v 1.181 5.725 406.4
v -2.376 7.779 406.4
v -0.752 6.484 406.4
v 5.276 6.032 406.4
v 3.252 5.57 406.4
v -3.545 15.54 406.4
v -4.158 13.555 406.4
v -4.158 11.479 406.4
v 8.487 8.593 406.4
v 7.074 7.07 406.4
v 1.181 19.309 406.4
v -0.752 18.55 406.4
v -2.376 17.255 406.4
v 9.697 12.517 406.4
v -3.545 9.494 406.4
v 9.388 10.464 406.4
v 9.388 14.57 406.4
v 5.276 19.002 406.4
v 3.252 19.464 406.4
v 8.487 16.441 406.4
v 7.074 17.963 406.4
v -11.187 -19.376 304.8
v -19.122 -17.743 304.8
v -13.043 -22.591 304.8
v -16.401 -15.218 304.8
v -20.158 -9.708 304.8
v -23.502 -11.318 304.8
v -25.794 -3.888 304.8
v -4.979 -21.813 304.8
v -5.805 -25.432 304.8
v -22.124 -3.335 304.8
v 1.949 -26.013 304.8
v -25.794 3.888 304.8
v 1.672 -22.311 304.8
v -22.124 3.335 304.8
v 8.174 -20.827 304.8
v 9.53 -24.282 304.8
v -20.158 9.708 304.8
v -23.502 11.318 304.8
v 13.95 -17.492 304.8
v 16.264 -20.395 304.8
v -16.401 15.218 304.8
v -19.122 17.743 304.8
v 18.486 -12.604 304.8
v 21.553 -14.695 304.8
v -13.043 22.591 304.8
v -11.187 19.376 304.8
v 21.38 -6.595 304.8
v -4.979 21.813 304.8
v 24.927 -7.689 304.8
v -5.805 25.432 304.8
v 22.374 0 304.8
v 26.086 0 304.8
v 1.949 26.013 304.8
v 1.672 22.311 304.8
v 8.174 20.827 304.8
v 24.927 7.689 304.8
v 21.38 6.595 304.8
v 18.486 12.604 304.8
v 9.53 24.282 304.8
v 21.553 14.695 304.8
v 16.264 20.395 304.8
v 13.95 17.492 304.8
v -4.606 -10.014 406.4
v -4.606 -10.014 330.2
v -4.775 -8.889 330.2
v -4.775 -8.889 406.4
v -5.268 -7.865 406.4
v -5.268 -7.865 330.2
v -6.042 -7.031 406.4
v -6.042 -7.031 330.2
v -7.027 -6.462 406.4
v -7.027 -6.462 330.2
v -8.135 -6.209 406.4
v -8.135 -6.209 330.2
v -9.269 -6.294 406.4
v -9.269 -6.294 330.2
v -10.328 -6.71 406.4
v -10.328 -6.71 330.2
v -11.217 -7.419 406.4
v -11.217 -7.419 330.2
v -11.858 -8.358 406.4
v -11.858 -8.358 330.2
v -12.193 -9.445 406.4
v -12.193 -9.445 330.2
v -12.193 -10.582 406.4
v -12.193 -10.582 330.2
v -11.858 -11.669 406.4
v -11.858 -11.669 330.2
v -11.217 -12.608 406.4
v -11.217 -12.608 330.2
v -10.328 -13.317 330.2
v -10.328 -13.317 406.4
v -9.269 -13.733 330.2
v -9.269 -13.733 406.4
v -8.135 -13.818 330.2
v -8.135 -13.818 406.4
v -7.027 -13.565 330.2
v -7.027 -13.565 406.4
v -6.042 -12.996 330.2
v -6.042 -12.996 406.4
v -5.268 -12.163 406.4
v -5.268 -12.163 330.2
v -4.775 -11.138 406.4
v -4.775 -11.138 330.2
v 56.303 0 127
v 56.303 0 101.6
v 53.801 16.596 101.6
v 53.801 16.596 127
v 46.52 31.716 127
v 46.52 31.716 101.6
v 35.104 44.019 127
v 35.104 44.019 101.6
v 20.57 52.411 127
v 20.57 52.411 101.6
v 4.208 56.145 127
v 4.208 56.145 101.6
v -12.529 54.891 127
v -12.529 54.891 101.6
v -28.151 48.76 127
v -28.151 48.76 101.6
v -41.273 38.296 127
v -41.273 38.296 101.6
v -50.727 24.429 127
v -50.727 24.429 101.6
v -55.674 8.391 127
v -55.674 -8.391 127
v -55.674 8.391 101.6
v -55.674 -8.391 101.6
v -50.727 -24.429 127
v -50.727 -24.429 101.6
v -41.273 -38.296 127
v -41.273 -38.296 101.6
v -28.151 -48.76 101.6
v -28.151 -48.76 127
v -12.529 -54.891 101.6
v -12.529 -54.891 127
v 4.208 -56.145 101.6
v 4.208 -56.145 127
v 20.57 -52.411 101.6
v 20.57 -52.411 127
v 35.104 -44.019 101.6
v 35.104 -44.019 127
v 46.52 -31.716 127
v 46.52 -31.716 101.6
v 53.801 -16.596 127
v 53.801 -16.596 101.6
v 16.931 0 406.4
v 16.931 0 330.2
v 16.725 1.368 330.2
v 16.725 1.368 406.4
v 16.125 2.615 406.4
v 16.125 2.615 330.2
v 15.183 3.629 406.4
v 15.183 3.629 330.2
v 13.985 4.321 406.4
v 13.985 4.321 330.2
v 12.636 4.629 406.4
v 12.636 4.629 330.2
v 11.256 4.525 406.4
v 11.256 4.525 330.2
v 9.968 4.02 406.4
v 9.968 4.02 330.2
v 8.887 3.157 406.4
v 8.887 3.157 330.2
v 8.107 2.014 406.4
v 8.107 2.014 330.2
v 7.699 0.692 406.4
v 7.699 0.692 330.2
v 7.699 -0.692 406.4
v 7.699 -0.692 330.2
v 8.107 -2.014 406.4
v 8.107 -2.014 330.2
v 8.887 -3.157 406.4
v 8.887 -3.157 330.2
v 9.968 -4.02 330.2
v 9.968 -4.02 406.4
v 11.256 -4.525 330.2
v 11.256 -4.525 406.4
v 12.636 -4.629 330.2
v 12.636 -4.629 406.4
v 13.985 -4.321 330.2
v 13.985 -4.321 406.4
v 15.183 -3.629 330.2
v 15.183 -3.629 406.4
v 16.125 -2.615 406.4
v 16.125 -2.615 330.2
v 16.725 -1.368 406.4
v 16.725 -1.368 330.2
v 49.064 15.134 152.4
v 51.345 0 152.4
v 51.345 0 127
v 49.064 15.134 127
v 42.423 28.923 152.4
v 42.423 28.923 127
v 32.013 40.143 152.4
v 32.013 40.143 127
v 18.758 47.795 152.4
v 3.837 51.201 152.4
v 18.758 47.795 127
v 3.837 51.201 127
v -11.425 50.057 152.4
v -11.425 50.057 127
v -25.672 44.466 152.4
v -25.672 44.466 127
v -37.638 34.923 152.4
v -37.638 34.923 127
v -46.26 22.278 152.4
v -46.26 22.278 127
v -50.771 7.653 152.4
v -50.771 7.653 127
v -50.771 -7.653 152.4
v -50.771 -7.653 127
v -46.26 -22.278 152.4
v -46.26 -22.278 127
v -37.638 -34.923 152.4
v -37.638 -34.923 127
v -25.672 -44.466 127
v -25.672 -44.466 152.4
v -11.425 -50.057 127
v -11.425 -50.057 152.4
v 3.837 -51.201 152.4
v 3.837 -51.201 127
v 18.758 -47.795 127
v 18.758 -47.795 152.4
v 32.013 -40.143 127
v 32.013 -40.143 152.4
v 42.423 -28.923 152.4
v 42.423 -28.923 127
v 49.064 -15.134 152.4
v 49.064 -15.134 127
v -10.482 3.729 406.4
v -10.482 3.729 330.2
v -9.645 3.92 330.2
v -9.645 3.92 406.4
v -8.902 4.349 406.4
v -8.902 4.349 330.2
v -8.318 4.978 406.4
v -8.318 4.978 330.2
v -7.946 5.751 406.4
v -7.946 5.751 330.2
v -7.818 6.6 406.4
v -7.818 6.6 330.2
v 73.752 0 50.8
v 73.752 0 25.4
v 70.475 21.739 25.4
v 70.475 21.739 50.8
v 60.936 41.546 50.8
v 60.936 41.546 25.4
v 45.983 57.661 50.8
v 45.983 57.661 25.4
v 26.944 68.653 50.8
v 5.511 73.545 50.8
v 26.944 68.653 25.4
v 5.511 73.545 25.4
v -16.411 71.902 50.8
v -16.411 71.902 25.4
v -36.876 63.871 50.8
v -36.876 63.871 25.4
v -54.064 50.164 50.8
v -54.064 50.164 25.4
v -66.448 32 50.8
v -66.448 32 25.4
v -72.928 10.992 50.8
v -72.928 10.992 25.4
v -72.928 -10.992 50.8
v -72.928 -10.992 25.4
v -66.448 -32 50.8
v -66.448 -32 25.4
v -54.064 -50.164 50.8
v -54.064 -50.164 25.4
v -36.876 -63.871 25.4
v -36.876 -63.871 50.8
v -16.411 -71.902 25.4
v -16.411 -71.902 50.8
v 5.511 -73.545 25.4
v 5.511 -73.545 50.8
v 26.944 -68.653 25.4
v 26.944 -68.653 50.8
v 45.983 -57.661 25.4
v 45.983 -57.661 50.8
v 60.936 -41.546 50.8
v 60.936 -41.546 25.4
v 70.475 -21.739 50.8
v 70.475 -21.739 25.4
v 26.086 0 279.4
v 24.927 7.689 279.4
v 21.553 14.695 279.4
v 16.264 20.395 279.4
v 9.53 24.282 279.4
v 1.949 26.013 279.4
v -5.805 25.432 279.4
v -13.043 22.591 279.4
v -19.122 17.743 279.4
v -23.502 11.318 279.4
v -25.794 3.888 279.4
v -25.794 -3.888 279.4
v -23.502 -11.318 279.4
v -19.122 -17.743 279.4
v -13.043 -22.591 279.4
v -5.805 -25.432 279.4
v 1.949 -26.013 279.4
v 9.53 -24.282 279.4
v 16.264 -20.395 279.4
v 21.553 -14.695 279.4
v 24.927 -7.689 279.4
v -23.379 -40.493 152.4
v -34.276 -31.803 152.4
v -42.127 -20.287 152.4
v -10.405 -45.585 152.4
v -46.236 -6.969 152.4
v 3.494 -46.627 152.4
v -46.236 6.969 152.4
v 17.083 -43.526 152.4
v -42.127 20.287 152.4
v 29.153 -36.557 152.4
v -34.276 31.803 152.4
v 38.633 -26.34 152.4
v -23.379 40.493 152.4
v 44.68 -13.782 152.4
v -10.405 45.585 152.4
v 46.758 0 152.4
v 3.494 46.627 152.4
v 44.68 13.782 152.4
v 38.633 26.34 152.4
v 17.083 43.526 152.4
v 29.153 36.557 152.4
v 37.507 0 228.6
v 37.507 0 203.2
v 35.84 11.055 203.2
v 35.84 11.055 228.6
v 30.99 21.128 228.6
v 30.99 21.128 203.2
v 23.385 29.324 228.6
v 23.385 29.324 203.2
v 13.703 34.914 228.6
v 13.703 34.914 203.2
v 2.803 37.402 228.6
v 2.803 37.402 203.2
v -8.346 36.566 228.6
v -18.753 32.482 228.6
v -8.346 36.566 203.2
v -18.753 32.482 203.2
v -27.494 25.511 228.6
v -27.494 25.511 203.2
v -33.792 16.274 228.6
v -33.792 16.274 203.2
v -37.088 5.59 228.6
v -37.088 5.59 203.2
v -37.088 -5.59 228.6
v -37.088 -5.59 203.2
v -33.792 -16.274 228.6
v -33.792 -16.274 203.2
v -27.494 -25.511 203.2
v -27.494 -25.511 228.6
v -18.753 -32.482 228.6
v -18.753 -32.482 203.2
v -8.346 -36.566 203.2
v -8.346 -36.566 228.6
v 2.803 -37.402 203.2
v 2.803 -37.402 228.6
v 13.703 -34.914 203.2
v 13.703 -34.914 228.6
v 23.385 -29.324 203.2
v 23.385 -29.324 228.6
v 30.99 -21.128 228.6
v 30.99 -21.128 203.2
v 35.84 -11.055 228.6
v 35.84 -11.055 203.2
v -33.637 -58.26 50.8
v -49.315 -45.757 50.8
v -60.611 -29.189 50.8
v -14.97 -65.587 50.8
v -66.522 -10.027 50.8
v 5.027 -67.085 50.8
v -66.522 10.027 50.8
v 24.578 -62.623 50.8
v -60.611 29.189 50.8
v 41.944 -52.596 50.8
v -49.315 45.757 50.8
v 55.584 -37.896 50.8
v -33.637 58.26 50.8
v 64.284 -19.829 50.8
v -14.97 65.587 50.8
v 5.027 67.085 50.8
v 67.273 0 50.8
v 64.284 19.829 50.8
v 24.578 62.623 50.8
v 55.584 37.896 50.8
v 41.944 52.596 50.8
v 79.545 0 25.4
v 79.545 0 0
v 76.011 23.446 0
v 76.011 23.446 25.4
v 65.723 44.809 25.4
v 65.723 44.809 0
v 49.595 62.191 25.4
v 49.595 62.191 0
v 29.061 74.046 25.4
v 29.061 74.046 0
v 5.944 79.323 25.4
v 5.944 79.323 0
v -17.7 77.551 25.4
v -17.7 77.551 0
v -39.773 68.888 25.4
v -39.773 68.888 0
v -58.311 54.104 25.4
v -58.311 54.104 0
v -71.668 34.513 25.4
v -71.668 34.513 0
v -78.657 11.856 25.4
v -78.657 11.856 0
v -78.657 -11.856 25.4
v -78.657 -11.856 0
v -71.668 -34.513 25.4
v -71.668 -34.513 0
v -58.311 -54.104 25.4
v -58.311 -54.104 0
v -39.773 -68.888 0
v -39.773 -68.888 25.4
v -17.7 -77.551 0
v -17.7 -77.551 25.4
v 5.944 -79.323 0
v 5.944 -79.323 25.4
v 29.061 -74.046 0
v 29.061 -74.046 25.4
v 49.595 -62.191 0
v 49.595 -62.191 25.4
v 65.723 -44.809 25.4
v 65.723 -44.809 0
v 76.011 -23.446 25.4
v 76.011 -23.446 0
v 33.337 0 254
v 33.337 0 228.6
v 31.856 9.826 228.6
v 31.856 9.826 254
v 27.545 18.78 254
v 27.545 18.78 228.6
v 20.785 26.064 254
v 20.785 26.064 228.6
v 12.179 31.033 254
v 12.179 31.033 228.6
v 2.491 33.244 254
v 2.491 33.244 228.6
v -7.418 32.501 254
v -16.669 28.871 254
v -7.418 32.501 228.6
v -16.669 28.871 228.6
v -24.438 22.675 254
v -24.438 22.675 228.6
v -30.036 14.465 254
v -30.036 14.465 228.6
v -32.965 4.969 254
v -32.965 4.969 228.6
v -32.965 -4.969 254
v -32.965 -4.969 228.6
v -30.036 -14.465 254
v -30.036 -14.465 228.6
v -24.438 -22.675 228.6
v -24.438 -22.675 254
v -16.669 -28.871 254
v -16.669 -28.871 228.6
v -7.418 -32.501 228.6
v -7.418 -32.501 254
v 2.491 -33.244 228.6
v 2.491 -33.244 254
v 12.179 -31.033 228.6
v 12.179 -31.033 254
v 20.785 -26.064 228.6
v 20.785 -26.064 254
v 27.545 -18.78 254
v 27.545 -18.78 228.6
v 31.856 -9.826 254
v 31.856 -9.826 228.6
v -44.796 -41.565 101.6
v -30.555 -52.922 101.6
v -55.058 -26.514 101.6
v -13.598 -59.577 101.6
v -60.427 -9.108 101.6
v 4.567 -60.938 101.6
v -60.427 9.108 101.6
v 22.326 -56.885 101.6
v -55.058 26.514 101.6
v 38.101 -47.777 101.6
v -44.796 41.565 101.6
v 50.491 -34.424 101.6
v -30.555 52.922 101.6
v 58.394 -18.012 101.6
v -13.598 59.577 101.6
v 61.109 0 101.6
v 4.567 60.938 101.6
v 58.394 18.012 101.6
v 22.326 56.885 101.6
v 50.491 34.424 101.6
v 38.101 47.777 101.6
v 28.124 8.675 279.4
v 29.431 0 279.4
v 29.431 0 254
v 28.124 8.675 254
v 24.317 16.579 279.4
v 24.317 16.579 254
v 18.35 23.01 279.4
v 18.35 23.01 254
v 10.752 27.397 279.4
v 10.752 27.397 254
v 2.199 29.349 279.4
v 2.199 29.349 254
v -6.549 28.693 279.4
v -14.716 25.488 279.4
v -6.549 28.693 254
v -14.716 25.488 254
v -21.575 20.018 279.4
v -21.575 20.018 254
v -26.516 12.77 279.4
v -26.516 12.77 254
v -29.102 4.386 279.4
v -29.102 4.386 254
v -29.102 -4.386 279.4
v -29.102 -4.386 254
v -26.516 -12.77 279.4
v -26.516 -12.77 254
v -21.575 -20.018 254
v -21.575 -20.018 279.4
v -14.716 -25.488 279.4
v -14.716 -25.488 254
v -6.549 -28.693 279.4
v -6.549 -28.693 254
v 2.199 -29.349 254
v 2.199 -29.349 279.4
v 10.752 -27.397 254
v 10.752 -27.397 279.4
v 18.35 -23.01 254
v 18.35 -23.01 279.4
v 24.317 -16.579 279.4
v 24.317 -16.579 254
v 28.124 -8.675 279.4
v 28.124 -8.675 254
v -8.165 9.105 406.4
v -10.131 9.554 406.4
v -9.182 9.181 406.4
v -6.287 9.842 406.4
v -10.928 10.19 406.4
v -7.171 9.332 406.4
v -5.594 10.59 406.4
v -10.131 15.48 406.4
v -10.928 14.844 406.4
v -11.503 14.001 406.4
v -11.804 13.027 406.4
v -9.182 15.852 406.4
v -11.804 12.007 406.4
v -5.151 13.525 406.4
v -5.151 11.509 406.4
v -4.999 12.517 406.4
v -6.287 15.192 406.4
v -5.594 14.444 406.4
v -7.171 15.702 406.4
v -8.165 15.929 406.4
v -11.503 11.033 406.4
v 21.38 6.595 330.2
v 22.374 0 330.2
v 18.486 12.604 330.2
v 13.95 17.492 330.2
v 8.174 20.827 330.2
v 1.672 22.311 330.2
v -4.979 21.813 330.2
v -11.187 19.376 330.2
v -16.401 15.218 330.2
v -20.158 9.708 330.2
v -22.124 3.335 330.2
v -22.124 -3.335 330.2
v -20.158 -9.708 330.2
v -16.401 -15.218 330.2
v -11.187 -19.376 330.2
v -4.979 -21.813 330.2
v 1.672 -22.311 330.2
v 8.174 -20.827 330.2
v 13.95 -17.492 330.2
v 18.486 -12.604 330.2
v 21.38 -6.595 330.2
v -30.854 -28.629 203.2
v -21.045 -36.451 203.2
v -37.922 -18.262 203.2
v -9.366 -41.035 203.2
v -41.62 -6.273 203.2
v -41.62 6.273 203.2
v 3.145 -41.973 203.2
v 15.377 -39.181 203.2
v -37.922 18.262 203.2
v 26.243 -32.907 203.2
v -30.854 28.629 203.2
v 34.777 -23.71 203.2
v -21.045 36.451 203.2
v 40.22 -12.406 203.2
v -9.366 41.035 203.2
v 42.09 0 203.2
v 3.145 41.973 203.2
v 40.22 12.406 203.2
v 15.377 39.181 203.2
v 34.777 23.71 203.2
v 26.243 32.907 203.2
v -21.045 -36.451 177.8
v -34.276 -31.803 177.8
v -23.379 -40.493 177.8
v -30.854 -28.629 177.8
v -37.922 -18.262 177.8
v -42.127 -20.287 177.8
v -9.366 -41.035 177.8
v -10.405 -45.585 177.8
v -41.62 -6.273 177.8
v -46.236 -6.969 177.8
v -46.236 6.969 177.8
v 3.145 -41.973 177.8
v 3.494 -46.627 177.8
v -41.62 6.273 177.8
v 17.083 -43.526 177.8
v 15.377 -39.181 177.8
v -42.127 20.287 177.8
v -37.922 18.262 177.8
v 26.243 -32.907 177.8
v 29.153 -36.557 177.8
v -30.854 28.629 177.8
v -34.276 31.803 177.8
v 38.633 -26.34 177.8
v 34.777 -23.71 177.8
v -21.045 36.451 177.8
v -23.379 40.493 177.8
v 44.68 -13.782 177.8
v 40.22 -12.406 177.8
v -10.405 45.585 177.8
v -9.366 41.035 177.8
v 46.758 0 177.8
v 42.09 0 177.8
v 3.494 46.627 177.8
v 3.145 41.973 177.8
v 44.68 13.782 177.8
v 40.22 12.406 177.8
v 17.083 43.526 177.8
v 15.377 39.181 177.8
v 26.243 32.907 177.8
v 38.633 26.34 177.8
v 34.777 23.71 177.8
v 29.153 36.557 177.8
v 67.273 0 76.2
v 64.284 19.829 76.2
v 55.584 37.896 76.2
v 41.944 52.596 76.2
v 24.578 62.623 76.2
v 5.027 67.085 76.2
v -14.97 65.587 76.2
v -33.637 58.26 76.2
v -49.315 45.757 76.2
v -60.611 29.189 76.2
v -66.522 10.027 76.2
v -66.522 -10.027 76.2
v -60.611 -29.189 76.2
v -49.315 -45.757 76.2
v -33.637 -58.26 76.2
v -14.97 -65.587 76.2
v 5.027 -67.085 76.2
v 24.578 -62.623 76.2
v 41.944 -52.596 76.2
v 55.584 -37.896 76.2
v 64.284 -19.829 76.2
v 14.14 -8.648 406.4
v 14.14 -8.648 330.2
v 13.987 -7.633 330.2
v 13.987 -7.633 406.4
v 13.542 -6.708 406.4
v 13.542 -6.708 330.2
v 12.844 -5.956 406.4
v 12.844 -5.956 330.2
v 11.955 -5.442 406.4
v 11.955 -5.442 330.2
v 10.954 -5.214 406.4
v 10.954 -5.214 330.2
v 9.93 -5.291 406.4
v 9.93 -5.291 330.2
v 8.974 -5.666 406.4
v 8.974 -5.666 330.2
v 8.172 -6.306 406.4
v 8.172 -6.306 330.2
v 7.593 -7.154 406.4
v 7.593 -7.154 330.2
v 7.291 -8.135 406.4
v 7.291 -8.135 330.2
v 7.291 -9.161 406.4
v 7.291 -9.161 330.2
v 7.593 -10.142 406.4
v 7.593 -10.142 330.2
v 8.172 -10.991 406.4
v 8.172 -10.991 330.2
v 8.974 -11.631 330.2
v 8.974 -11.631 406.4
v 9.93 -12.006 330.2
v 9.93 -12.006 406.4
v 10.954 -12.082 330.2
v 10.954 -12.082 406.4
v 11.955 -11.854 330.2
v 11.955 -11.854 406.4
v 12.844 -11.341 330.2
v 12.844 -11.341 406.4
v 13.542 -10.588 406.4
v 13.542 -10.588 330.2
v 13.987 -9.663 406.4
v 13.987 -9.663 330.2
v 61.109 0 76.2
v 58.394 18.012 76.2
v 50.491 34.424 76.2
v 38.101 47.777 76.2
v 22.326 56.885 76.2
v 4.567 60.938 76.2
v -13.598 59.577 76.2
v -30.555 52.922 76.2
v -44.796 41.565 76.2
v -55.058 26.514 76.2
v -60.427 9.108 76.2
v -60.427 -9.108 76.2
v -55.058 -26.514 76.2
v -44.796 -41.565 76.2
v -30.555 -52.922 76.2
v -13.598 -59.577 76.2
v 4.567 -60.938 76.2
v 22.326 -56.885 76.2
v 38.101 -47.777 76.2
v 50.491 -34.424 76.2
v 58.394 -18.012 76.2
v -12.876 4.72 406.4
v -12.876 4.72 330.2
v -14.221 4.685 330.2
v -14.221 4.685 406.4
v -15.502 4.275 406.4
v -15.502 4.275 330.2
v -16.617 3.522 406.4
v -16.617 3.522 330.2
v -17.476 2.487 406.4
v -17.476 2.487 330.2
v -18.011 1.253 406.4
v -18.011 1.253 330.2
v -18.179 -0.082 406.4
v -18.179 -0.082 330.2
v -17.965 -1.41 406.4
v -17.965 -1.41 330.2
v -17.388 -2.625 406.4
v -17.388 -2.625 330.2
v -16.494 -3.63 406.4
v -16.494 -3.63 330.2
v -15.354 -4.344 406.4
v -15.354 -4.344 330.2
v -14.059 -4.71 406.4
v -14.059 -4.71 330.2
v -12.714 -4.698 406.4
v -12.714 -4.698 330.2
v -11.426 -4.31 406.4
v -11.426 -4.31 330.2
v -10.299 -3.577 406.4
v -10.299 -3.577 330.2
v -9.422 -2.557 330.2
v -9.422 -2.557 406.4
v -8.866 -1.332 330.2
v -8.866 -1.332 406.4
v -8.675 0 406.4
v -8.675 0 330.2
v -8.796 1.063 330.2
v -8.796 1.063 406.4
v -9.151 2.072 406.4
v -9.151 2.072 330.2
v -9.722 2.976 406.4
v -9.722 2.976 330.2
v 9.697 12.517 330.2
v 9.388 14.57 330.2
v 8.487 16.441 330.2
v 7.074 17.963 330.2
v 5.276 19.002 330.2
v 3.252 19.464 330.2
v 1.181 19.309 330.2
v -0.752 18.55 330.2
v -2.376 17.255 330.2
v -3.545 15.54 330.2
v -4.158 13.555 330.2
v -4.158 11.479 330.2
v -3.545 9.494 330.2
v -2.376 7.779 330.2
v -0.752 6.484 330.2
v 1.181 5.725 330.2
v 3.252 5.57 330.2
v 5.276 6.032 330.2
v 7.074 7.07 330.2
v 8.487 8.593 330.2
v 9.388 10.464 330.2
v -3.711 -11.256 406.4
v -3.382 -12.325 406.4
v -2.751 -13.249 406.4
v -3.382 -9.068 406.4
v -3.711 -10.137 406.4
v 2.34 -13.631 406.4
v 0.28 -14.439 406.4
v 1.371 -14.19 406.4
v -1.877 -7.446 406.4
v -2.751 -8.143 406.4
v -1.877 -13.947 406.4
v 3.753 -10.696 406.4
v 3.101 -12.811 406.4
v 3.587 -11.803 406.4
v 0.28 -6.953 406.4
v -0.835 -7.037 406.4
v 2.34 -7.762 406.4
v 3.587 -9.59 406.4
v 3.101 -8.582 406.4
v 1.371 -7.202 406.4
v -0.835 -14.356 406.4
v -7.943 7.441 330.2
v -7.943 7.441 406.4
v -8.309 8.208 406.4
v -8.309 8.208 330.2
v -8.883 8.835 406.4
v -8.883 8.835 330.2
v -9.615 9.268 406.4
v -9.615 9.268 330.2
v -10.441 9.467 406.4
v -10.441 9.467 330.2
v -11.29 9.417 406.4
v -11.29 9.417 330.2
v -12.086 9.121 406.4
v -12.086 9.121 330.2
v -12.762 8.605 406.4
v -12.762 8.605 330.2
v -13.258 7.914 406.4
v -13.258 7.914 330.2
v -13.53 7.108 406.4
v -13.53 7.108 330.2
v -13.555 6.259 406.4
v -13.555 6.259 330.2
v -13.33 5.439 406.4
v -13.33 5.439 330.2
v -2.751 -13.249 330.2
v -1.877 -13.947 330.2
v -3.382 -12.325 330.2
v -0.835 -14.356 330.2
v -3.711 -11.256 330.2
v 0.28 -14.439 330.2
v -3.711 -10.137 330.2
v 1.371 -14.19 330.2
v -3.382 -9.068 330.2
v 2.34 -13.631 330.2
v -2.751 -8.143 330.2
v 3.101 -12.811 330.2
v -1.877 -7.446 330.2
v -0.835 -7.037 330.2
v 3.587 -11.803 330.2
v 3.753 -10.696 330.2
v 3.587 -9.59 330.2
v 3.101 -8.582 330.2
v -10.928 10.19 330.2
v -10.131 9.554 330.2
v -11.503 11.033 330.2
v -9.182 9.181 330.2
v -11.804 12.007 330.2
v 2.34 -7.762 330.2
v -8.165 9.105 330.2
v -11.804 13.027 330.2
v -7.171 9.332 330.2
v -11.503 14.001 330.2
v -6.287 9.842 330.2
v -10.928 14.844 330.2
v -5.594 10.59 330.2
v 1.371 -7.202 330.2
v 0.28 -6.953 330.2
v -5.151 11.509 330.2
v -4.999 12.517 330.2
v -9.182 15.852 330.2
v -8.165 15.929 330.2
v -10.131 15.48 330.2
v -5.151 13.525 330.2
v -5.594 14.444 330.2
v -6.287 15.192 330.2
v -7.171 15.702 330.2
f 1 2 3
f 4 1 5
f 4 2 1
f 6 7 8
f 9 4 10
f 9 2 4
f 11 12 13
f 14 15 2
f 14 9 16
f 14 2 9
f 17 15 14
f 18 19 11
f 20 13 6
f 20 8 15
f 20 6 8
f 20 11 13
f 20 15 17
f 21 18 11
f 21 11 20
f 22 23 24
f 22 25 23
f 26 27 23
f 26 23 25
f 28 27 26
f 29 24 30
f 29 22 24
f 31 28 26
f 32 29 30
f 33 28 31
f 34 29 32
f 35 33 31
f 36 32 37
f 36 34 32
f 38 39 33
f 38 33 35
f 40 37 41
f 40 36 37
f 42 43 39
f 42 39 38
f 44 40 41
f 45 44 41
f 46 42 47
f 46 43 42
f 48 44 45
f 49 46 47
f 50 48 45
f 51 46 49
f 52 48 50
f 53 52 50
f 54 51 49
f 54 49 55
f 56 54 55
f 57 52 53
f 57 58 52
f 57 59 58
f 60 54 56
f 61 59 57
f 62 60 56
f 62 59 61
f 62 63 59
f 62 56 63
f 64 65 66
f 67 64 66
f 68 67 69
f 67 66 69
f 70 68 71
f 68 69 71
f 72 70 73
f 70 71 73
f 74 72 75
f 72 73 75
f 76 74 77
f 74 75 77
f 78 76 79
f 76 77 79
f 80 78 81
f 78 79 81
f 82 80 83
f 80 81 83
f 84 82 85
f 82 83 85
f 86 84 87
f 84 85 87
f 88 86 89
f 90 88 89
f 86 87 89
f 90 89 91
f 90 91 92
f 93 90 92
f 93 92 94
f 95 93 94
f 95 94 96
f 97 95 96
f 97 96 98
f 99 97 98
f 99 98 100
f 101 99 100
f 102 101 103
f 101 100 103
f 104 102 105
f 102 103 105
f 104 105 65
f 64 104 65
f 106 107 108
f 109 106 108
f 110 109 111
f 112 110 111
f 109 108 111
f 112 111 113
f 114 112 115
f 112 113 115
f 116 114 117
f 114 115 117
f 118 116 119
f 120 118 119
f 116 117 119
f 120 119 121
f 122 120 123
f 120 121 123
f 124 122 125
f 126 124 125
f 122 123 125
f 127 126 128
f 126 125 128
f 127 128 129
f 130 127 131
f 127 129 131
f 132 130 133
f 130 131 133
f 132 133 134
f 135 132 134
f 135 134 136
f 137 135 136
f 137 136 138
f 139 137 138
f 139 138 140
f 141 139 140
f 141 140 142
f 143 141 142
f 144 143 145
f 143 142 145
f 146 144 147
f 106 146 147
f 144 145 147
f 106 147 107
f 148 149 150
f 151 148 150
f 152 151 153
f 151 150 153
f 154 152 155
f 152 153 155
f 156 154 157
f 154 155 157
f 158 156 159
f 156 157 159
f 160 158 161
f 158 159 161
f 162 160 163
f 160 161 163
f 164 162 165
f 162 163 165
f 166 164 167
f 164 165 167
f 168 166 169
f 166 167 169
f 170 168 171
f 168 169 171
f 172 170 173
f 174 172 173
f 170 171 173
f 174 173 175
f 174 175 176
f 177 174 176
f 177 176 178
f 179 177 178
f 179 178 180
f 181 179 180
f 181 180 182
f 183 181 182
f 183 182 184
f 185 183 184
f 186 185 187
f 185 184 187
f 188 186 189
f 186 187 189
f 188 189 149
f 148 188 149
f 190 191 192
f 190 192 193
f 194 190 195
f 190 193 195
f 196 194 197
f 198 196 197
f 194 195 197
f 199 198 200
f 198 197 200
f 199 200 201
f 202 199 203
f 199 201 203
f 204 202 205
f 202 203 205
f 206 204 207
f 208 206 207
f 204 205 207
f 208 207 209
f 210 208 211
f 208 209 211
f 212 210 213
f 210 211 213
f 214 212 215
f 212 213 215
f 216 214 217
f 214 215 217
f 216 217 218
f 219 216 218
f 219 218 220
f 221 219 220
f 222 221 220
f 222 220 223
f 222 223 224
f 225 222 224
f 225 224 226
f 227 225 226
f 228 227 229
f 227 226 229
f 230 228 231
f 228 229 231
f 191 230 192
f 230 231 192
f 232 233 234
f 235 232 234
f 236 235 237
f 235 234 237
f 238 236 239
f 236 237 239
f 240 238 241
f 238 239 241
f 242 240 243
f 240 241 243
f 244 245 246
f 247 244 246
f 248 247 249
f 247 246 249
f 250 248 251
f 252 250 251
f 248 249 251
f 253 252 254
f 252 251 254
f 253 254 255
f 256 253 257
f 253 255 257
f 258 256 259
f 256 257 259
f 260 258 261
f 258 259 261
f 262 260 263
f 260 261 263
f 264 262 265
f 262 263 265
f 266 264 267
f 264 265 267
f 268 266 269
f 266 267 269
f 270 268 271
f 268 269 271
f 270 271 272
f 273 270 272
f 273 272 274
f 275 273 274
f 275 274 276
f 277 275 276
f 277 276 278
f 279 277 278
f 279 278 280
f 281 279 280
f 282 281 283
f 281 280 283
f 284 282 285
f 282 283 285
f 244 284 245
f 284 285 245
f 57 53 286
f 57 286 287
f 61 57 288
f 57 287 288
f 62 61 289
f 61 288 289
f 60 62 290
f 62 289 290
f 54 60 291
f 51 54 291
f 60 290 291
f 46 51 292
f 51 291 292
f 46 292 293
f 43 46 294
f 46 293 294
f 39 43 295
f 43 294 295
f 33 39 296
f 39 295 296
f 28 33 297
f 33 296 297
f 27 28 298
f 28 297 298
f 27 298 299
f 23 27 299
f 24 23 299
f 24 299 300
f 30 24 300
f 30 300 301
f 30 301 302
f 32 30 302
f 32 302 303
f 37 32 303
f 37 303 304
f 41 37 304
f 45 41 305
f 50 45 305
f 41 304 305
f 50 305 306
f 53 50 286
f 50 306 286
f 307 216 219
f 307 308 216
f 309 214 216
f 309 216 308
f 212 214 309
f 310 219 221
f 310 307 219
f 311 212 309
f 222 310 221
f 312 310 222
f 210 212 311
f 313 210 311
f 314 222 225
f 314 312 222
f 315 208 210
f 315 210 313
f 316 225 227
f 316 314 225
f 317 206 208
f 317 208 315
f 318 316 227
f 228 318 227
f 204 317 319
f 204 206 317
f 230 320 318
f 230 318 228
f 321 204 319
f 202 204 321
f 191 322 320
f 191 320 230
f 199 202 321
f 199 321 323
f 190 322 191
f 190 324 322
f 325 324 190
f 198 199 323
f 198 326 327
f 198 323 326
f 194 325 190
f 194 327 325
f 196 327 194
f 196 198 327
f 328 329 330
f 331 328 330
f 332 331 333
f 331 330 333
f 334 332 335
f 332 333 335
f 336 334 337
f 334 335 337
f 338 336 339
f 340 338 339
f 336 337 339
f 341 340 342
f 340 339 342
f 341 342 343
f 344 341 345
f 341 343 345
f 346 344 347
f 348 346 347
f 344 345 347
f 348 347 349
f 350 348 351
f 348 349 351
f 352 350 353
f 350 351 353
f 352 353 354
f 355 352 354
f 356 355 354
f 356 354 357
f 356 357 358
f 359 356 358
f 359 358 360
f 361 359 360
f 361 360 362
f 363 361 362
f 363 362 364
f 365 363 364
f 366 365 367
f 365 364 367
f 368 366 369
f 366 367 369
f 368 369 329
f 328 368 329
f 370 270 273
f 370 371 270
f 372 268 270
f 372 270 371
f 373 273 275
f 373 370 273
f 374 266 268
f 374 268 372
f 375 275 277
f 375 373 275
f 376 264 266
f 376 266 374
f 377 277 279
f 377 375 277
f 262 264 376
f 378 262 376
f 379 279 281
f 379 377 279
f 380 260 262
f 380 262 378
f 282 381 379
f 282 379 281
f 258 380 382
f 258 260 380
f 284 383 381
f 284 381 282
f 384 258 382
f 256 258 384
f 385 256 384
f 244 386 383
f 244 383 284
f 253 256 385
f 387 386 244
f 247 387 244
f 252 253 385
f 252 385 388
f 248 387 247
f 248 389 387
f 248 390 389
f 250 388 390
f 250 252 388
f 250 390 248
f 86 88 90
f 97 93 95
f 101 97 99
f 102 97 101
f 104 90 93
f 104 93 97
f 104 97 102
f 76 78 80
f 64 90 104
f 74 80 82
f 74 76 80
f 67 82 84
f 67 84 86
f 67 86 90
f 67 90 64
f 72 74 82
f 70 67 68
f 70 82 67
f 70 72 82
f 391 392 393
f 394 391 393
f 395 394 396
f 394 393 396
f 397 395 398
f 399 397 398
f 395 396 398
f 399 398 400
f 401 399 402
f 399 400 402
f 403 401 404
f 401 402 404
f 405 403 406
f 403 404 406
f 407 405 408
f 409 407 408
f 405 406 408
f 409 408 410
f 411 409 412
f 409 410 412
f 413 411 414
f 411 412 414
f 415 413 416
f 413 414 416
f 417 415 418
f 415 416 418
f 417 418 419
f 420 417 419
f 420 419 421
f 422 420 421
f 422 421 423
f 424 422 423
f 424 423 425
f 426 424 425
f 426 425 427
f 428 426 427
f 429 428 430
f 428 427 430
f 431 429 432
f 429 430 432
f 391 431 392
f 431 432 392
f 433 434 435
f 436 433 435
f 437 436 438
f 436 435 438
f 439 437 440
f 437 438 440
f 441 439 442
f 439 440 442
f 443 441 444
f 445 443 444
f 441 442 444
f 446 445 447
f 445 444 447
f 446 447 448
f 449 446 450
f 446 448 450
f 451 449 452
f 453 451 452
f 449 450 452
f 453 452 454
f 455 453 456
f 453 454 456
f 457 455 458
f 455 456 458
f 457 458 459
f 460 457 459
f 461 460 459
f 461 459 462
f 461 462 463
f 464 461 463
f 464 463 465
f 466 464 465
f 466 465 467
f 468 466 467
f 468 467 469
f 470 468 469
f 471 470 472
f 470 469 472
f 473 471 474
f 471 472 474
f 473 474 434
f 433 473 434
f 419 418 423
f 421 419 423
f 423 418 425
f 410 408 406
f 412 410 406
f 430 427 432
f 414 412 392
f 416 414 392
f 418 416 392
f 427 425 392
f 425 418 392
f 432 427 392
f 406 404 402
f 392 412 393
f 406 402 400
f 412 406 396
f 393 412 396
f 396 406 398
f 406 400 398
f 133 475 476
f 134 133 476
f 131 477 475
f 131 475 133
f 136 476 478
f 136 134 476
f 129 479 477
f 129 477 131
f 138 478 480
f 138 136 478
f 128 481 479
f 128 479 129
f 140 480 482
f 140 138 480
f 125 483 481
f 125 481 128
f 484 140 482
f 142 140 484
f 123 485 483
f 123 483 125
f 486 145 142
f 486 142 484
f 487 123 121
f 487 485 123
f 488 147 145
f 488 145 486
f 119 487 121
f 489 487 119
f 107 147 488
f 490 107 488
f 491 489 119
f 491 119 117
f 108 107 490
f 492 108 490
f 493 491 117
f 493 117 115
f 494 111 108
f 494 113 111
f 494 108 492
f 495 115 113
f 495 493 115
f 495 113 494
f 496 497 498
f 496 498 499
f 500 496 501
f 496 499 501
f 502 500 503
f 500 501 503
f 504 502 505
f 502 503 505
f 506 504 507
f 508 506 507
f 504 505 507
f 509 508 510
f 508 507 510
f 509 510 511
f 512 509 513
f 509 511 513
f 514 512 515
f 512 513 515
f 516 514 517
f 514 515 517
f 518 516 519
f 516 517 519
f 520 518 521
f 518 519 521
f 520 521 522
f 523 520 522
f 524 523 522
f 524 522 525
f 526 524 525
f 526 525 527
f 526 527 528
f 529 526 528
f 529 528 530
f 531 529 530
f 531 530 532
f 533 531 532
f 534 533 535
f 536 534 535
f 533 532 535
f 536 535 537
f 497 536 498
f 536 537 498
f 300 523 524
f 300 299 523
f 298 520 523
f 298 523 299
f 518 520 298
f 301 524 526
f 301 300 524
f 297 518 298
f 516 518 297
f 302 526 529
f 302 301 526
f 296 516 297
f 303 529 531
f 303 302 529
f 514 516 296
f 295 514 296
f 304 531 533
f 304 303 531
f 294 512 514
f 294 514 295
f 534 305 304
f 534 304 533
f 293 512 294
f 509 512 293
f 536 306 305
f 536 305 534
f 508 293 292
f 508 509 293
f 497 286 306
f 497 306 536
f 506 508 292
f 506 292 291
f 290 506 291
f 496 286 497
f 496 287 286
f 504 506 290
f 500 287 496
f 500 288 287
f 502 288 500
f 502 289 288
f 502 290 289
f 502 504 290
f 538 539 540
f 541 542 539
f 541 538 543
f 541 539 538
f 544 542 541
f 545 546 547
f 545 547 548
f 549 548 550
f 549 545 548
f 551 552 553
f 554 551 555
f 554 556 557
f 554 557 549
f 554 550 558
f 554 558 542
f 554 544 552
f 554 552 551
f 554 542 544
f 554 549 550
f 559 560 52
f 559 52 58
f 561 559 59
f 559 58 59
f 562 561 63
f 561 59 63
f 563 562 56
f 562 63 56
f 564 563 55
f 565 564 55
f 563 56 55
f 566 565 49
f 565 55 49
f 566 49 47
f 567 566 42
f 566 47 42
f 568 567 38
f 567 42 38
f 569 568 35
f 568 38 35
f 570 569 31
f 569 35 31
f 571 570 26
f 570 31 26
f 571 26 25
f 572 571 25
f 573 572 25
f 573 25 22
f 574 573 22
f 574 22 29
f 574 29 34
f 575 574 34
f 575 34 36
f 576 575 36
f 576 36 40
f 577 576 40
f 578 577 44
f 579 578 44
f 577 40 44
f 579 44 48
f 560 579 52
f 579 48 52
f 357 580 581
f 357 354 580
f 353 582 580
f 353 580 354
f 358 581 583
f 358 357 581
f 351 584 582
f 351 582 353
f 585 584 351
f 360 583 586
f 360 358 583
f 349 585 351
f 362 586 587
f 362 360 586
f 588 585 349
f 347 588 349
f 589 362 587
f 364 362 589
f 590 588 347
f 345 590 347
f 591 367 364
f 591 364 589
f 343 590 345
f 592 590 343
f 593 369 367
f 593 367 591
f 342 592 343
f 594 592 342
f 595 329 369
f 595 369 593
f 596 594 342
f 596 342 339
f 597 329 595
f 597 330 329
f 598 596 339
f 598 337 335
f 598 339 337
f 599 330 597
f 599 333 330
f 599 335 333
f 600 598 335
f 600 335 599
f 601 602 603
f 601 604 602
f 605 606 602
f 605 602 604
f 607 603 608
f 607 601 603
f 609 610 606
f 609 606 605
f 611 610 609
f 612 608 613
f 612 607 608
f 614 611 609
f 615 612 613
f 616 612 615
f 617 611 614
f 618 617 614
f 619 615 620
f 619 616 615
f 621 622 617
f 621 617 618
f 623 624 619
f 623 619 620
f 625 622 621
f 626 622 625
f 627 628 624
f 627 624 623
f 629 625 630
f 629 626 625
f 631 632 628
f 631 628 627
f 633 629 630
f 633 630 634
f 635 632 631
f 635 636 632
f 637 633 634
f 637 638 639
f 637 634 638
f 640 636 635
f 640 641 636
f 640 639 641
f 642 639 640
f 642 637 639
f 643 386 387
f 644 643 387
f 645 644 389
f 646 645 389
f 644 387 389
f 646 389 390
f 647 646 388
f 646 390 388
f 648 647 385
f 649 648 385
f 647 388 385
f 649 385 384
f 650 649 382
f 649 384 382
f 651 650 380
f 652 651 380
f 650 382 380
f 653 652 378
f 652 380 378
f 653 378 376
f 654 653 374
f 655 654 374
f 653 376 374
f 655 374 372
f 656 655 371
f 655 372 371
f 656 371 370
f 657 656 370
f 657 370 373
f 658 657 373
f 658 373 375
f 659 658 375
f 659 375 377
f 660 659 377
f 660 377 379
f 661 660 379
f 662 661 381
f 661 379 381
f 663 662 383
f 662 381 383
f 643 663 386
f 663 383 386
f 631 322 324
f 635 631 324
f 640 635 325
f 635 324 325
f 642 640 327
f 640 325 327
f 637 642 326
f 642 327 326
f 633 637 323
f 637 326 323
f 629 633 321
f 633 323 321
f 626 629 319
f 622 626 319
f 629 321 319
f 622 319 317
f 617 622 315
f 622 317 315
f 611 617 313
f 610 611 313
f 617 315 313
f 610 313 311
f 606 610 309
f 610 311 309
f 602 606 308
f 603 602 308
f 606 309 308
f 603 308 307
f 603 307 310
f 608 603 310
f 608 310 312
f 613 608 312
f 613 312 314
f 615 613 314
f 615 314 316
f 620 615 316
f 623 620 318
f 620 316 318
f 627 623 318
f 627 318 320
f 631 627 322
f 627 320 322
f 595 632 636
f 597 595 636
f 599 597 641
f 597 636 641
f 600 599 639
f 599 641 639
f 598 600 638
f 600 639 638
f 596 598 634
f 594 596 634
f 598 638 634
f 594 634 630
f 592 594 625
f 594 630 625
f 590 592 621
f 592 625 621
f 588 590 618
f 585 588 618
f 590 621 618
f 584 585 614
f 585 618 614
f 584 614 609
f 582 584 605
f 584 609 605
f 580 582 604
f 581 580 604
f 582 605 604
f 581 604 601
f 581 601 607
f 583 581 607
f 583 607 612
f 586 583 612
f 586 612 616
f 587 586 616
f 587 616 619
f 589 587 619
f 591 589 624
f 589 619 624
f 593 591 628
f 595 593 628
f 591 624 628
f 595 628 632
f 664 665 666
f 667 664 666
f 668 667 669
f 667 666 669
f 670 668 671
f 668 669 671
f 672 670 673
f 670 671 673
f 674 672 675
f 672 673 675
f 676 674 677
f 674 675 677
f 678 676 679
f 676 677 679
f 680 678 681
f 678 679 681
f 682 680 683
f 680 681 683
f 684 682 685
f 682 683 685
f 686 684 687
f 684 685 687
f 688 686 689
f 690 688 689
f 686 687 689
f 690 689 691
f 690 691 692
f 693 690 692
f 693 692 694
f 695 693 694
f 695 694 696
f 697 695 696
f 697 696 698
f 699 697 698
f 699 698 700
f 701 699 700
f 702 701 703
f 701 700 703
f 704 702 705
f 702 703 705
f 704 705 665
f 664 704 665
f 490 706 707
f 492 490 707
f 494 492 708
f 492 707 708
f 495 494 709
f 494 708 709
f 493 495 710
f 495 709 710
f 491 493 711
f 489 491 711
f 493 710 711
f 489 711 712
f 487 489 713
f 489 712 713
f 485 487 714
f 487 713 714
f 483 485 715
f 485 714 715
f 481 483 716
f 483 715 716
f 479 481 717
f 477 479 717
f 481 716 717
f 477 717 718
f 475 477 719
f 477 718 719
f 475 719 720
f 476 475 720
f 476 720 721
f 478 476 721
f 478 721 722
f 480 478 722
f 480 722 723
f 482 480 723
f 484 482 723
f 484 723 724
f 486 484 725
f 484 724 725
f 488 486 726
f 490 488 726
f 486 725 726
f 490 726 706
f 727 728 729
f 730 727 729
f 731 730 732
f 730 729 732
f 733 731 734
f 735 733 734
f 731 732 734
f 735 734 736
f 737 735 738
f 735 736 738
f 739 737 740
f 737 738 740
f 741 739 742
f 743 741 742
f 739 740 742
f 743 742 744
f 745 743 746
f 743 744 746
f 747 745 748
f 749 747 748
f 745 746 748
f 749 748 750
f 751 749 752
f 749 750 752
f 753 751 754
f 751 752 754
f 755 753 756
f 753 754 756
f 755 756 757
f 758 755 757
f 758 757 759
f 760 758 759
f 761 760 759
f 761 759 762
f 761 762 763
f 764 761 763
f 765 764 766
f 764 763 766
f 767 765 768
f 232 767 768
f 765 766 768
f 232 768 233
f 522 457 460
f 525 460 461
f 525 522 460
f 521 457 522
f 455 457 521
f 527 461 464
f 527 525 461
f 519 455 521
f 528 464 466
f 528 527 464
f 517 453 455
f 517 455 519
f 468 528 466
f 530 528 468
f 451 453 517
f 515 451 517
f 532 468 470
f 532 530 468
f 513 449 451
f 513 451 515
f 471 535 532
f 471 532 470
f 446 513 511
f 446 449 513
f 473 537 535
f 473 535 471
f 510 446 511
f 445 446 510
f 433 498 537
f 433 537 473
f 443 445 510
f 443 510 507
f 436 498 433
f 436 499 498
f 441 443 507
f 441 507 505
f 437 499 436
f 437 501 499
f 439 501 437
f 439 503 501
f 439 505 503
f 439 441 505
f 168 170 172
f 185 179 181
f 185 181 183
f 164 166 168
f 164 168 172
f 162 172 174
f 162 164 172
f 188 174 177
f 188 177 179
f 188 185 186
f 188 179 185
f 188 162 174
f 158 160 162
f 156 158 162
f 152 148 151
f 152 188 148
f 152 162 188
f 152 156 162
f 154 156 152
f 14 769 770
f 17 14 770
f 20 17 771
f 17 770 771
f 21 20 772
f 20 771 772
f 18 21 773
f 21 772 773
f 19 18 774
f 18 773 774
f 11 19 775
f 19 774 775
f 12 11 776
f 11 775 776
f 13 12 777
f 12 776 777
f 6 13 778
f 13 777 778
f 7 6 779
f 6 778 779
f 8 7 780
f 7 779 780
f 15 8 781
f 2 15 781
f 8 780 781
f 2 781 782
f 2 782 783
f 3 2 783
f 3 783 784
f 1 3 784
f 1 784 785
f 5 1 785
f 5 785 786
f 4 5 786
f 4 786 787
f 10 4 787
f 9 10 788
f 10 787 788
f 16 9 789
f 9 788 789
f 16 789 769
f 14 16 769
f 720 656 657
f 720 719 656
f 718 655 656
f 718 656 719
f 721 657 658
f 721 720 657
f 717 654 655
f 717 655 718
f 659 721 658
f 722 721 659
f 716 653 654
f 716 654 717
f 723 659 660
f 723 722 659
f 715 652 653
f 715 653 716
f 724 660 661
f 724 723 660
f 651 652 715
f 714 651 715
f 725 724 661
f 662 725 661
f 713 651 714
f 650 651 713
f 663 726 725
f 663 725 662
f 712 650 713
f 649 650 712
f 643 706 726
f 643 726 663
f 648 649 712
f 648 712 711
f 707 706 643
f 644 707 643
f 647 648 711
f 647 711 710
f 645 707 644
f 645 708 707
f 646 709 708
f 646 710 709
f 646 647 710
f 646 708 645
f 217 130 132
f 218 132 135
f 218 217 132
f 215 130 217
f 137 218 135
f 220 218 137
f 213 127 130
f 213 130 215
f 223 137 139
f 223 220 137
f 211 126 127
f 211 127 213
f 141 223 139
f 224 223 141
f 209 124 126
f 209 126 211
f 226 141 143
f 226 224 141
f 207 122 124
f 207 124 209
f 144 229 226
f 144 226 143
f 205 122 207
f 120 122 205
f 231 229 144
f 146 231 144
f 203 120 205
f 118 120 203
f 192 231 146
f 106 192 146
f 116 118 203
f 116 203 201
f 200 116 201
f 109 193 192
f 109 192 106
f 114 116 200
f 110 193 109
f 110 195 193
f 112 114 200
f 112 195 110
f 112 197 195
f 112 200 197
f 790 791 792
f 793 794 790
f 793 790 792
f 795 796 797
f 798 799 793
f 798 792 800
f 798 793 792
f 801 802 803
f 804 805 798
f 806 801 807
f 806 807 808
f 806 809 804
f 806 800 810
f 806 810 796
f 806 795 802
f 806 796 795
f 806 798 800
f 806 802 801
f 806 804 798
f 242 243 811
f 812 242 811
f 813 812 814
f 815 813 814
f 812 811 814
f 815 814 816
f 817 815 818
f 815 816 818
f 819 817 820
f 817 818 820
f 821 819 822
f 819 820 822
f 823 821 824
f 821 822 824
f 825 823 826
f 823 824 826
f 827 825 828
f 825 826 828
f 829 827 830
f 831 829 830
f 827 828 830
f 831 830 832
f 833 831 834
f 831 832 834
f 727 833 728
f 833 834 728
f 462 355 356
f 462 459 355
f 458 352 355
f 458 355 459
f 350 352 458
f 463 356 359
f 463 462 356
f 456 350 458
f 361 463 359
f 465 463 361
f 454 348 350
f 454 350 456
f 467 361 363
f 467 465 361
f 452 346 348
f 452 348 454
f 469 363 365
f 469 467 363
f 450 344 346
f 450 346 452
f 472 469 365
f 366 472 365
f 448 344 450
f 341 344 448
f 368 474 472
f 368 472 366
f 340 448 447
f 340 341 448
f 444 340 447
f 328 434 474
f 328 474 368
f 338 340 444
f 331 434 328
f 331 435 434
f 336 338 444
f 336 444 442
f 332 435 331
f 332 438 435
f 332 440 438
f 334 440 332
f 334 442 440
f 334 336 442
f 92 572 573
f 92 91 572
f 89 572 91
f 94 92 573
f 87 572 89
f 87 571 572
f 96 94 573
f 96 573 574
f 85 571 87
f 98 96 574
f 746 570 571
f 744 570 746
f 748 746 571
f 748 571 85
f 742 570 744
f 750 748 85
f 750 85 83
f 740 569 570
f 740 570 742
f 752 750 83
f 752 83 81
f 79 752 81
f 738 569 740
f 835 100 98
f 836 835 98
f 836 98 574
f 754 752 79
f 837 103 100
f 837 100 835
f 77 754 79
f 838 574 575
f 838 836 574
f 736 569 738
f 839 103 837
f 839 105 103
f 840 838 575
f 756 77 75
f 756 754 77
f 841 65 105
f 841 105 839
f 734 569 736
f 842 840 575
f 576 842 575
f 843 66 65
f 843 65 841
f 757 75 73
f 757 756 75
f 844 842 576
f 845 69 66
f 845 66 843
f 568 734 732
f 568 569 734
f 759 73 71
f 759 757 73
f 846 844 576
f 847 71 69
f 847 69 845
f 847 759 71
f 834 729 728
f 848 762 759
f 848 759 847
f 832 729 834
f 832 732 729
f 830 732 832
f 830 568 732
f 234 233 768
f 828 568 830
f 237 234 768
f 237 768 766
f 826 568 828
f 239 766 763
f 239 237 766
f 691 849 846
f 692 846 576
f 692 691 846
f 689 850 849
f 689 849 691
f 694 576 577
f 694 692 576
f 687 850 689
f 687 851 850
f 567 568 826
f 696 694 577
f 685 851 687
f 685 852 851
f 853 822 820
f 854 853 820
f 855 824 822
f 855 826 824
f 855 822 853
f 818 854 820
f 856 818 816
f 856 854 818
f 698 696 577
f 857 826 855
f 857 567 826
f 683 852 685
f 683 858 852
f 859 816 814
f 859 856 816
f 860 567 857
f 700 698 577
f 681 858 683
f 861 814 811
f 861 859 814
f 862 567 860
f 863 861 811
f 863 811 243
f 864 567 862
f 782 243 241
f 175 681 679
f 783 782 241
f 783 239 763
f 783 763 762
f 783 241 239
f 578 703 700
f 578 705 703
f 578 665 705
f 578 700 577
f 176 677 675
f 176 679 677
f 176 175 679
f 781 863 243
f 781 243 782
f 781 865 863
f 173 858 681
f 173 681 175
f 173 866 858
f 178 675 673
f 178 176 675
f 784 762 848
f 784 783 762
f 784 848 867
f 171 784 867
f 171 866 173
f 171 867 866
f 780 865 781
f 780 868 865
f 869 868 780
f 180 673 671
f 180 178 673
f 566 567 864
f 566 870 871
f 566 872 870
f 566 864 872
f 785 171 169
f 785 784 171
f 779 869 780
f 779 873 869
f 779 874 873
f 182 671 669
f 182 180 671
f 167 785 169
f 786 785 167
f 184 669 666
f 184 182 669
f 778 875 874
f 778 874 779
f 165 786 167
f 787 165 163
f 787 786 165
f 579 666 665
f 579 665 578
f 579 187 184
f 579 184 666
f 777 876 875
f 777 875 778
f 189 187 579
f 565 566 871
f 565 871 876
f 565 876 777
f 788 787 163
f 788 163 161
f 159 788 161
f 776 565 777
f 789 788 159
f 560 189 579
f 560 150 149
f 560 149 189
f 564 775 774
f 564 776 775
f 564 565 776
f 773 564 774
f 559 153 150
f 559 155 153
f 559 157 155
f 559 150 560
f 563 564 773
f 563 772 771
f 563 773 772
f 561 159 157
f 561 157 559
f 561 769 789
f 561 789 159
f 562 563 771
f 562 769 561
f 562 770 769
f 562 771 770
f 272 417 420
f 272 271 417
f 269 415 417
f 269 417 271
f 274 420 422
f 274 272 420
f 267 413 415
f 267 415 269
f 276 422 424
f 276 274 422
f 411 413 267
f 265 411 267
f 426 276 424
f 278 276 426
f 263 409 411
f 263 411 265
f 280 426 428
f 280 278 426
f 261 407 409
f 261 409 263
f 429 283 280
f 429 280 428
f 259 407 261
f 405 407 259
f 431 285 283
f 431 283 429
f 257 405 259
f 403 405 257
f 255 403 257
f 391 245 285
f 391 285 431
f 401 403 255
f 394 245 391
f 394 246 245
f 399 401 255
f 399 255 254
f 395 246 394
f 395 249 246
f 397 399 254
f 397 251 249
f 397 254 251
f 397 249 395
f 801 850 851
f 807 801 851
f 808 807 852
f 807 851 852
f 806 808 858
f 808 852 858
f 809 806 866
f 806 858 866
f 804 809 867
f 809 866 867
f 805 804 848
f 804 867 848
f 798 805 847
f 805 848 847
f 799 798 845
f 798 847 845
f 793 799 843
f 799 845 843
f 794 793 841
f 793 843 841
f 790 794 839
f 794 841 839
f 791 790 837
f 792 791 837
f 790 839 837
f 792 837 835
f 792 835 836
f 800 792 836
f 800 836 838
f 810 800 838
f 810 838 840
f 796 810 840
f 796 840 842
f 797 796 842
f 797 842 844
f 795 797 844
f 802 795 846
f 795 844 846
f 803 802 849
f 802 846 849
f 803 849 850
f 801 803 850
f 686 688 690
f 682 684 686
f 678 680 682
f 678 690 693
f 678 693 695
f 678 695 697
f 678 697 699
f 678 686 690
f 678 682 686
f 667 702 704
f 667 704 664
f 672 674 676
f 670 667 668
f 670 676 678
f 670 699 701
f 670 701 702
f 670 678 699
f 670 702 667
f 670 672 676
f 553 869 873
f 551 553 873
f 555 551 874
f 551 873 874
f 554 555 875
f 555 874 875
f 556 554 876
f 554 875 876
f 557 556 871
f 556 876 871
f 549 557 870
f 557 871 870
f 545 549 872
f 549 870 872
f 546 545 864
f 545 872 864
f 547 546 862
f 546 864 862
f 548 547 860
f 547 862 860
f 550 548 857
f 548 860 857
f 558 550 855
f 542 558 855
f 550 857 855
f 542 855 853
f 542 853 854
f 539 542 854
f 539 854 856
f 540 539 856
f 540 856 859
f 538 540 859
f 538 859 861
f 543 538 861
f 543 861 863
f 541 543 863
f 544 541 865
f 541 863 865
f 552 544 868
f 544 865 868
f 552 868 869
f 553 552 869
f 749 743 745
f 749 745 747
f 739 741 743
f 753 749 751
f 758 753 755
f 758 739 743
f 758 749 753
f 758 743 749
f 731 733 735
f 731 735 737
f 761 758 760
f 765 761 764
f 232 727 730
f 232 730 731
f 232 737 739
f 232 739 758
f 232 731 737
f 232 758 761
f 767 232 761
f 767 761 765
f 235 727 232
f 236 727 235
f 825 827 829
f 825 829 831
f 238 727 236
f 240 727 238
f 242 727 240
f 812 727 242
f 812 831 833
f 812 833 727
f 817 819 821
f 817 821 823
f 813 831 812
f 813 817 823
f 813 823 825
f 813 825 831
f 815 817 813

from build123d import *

# Parameters (mm, degrees)
F0_R      = 79.5450036975
F1_DEPTH  = 25.4
F2_R      = 73.7515149203
F3_DEPTH  = 25.4
F4_R      = 67.2732126862
F5_DEPTH  = 25.4
F6_R      = 61.109227751
F7_DEPTH  = 25.4
F8_R      = 56.3027484013
F9_DEPTH  = 25.4
F10_R     = 51.3446313858
F11_DEPTH = 25.4
F12_R     = 46.7578066383
F13_DEPTH = 25.4
F14_R     = 42.0901979961
F15_DEPTH = 25.4
F16_R     = 37.5067154874
F17_DEPTH = 25.4
F18_R     = 33.3373265509
F19_DEPTH = 25.4
F20_R     = 29.4310817061
F21_DEPTH = 25.4
F22_R     = 26.0855959035
F23_DEPTH = 25.4
F24_R     = 22.3736631593
F25_DEPTH = 25.4
F26_R     = 3.4212934719
F26_R_2   = 3.8149535716
F26_R_3   = 4.641761037
F26_R_4   = 3.4439254553
F26_R_5   = 3.753363135
F26_R_6   = 6.9663604667
F27_DEPTH = 76.2


with BuildPart() as f1:
    # F0 (on Top) → F1 (new body)
    with BuildSketch(Plane.XY):
        Circle(F0_R)
    extrude(amount=F1_DEPTH)

    # F2 (on face) → F3 (join)
    with BuildSketch(Plane.XY.offset(25.4)):
        Circle(F2_R)
    extrude(amount=F3_DEPTH)

    # F4 (on face) → F5 (join)
    with BuildSketch(Plane.XY.offset(50.8)):
        Circle(F4_R)
    extrude(amount=F5_DEPTH)

    # F6 (on face) → F7 (join)
    with BuildSketch(Plane.XY.offset(76.2)):
        Circle(F6_R)
    extrude(amount=F7_DEPTH)

    # F8 (on face) → F9 (join)
    with BuildSketch(Plane.XY.offset(101.6)):
        Circle(F8_R)
    extrude(amount=F9_DEPTH)

    # F10 (on face) → F11 (join)
    with BuildSketch(Plane.XY.offset(127)):
        Circle(F10_R)
    extrude(amount=F11_DEPTH)

    # F12 (on face) → F13 (join)
    with BuildSketch(Plane.XY.offset(152.4)):
        Circle(F12_R)
    extrude(amount=F13_DEPTH)

    # F14 (on face) → F15 (join)
    with BuildSketch(Plane.XY.offset(177.8)):
        Circle(F14_R)
    extrude(amount=F15_DEPTH)

    # F16 (on face) → F17 (join)
    with BuildSketch(Plane.XY.offset(203.2)):
        Circle(F16_R)
    extrude(amount=F17_DEPTH)

    # F18 (on face) → F19 (join)
    with BuildSketch(Plane.XY.offset(228.6)):
        Circle(F18_R)
    extrude(amount=F19_DEPTH)

    # F20 (on face) → F21 (join)
    with BuildSketch(Plane.XY.offset(254)):
        Circle(F20_R)
    extrude(amount=F21_DEPTH)

    # F22 (on face) → F23 (join)
    with BuildSketch(Plane.XY.offset(279.4)):
        Circle(F22_R)
    extrude(amount=F23_DEPTH)

    # F24 (on face) → F25 (join)
    with BuildSketch(Plane.XY.offset(304.8)):
        Circle(F24_R)
    extrude(amount=F25_DEPTH)

    # F26 (on face) → F27 (join)
    with BuildSketch(Plane.XY.offset(330.2)):
        with Locations((-8.4204990417, 12.5169595703)):
            Circle(F26_R)
        with BuildLine():
            ThreePointArc((-12.8764627366, 4.7200013898), (-16.9768846981, -3.1594538942), (-8.6752507068, 0))
            ThreePointArc((-8.6752507068, 0), (-9.1506984309, 2.071867738), (-10.4819031466, 3.7291487844))
            ThreePointArc((-10.4819031466, 3.7291487844), (-11.7969854067, 3.9398859003), (-12.8764627366, 4.7200013898))
        make_face()
        with BuildLine():
            ThreePointArc((-12.8764627366, 4.7200013898), (-11.7969854067, 3.9398859003), (-10.4819031466, 3.7291487844))
            ThreePointArc((-10.4819031466, 3.7291487844), (-11.6103347479, 4.3909581613), (-12.8764627366, 4.7200013898))
        make_face()
        with BuildLine():
            ThreePointArc((-12.8764627366, 4.7200013898), (-11.6103347479, 4.3909581613), (-10.4819031466, 3.7291487844))
            ThreePointArc((-10.4819031466, 3.7291487844), (-8.5863196556, 4.6415751091), (-7.8176113456, 6.5998514183))
            ThreePointArc((-7.8176113456, 6.5998514183), (-11.6990310984, 9.298268247), (-12.8764627366, 4.7200013898))
        make_face()
        with Locations((-8.4204990417, -10.0135672837)):
            Circle(F26_R_2)
        with Locations((12.289378792, 0)):
            Circle(F26_R_3)
        with Locations((10.69631055, -8.6480807513)):
            Circle(F26_R_4)
        with Locations((0, -10.69631055)):
            Circle(F26_R_5)
        with Locations((2.7309742291, 12.5169595703)):
            Circle(F26_R_6)
    extrude(amount=F27_DEPTH)


solid = f1.part
